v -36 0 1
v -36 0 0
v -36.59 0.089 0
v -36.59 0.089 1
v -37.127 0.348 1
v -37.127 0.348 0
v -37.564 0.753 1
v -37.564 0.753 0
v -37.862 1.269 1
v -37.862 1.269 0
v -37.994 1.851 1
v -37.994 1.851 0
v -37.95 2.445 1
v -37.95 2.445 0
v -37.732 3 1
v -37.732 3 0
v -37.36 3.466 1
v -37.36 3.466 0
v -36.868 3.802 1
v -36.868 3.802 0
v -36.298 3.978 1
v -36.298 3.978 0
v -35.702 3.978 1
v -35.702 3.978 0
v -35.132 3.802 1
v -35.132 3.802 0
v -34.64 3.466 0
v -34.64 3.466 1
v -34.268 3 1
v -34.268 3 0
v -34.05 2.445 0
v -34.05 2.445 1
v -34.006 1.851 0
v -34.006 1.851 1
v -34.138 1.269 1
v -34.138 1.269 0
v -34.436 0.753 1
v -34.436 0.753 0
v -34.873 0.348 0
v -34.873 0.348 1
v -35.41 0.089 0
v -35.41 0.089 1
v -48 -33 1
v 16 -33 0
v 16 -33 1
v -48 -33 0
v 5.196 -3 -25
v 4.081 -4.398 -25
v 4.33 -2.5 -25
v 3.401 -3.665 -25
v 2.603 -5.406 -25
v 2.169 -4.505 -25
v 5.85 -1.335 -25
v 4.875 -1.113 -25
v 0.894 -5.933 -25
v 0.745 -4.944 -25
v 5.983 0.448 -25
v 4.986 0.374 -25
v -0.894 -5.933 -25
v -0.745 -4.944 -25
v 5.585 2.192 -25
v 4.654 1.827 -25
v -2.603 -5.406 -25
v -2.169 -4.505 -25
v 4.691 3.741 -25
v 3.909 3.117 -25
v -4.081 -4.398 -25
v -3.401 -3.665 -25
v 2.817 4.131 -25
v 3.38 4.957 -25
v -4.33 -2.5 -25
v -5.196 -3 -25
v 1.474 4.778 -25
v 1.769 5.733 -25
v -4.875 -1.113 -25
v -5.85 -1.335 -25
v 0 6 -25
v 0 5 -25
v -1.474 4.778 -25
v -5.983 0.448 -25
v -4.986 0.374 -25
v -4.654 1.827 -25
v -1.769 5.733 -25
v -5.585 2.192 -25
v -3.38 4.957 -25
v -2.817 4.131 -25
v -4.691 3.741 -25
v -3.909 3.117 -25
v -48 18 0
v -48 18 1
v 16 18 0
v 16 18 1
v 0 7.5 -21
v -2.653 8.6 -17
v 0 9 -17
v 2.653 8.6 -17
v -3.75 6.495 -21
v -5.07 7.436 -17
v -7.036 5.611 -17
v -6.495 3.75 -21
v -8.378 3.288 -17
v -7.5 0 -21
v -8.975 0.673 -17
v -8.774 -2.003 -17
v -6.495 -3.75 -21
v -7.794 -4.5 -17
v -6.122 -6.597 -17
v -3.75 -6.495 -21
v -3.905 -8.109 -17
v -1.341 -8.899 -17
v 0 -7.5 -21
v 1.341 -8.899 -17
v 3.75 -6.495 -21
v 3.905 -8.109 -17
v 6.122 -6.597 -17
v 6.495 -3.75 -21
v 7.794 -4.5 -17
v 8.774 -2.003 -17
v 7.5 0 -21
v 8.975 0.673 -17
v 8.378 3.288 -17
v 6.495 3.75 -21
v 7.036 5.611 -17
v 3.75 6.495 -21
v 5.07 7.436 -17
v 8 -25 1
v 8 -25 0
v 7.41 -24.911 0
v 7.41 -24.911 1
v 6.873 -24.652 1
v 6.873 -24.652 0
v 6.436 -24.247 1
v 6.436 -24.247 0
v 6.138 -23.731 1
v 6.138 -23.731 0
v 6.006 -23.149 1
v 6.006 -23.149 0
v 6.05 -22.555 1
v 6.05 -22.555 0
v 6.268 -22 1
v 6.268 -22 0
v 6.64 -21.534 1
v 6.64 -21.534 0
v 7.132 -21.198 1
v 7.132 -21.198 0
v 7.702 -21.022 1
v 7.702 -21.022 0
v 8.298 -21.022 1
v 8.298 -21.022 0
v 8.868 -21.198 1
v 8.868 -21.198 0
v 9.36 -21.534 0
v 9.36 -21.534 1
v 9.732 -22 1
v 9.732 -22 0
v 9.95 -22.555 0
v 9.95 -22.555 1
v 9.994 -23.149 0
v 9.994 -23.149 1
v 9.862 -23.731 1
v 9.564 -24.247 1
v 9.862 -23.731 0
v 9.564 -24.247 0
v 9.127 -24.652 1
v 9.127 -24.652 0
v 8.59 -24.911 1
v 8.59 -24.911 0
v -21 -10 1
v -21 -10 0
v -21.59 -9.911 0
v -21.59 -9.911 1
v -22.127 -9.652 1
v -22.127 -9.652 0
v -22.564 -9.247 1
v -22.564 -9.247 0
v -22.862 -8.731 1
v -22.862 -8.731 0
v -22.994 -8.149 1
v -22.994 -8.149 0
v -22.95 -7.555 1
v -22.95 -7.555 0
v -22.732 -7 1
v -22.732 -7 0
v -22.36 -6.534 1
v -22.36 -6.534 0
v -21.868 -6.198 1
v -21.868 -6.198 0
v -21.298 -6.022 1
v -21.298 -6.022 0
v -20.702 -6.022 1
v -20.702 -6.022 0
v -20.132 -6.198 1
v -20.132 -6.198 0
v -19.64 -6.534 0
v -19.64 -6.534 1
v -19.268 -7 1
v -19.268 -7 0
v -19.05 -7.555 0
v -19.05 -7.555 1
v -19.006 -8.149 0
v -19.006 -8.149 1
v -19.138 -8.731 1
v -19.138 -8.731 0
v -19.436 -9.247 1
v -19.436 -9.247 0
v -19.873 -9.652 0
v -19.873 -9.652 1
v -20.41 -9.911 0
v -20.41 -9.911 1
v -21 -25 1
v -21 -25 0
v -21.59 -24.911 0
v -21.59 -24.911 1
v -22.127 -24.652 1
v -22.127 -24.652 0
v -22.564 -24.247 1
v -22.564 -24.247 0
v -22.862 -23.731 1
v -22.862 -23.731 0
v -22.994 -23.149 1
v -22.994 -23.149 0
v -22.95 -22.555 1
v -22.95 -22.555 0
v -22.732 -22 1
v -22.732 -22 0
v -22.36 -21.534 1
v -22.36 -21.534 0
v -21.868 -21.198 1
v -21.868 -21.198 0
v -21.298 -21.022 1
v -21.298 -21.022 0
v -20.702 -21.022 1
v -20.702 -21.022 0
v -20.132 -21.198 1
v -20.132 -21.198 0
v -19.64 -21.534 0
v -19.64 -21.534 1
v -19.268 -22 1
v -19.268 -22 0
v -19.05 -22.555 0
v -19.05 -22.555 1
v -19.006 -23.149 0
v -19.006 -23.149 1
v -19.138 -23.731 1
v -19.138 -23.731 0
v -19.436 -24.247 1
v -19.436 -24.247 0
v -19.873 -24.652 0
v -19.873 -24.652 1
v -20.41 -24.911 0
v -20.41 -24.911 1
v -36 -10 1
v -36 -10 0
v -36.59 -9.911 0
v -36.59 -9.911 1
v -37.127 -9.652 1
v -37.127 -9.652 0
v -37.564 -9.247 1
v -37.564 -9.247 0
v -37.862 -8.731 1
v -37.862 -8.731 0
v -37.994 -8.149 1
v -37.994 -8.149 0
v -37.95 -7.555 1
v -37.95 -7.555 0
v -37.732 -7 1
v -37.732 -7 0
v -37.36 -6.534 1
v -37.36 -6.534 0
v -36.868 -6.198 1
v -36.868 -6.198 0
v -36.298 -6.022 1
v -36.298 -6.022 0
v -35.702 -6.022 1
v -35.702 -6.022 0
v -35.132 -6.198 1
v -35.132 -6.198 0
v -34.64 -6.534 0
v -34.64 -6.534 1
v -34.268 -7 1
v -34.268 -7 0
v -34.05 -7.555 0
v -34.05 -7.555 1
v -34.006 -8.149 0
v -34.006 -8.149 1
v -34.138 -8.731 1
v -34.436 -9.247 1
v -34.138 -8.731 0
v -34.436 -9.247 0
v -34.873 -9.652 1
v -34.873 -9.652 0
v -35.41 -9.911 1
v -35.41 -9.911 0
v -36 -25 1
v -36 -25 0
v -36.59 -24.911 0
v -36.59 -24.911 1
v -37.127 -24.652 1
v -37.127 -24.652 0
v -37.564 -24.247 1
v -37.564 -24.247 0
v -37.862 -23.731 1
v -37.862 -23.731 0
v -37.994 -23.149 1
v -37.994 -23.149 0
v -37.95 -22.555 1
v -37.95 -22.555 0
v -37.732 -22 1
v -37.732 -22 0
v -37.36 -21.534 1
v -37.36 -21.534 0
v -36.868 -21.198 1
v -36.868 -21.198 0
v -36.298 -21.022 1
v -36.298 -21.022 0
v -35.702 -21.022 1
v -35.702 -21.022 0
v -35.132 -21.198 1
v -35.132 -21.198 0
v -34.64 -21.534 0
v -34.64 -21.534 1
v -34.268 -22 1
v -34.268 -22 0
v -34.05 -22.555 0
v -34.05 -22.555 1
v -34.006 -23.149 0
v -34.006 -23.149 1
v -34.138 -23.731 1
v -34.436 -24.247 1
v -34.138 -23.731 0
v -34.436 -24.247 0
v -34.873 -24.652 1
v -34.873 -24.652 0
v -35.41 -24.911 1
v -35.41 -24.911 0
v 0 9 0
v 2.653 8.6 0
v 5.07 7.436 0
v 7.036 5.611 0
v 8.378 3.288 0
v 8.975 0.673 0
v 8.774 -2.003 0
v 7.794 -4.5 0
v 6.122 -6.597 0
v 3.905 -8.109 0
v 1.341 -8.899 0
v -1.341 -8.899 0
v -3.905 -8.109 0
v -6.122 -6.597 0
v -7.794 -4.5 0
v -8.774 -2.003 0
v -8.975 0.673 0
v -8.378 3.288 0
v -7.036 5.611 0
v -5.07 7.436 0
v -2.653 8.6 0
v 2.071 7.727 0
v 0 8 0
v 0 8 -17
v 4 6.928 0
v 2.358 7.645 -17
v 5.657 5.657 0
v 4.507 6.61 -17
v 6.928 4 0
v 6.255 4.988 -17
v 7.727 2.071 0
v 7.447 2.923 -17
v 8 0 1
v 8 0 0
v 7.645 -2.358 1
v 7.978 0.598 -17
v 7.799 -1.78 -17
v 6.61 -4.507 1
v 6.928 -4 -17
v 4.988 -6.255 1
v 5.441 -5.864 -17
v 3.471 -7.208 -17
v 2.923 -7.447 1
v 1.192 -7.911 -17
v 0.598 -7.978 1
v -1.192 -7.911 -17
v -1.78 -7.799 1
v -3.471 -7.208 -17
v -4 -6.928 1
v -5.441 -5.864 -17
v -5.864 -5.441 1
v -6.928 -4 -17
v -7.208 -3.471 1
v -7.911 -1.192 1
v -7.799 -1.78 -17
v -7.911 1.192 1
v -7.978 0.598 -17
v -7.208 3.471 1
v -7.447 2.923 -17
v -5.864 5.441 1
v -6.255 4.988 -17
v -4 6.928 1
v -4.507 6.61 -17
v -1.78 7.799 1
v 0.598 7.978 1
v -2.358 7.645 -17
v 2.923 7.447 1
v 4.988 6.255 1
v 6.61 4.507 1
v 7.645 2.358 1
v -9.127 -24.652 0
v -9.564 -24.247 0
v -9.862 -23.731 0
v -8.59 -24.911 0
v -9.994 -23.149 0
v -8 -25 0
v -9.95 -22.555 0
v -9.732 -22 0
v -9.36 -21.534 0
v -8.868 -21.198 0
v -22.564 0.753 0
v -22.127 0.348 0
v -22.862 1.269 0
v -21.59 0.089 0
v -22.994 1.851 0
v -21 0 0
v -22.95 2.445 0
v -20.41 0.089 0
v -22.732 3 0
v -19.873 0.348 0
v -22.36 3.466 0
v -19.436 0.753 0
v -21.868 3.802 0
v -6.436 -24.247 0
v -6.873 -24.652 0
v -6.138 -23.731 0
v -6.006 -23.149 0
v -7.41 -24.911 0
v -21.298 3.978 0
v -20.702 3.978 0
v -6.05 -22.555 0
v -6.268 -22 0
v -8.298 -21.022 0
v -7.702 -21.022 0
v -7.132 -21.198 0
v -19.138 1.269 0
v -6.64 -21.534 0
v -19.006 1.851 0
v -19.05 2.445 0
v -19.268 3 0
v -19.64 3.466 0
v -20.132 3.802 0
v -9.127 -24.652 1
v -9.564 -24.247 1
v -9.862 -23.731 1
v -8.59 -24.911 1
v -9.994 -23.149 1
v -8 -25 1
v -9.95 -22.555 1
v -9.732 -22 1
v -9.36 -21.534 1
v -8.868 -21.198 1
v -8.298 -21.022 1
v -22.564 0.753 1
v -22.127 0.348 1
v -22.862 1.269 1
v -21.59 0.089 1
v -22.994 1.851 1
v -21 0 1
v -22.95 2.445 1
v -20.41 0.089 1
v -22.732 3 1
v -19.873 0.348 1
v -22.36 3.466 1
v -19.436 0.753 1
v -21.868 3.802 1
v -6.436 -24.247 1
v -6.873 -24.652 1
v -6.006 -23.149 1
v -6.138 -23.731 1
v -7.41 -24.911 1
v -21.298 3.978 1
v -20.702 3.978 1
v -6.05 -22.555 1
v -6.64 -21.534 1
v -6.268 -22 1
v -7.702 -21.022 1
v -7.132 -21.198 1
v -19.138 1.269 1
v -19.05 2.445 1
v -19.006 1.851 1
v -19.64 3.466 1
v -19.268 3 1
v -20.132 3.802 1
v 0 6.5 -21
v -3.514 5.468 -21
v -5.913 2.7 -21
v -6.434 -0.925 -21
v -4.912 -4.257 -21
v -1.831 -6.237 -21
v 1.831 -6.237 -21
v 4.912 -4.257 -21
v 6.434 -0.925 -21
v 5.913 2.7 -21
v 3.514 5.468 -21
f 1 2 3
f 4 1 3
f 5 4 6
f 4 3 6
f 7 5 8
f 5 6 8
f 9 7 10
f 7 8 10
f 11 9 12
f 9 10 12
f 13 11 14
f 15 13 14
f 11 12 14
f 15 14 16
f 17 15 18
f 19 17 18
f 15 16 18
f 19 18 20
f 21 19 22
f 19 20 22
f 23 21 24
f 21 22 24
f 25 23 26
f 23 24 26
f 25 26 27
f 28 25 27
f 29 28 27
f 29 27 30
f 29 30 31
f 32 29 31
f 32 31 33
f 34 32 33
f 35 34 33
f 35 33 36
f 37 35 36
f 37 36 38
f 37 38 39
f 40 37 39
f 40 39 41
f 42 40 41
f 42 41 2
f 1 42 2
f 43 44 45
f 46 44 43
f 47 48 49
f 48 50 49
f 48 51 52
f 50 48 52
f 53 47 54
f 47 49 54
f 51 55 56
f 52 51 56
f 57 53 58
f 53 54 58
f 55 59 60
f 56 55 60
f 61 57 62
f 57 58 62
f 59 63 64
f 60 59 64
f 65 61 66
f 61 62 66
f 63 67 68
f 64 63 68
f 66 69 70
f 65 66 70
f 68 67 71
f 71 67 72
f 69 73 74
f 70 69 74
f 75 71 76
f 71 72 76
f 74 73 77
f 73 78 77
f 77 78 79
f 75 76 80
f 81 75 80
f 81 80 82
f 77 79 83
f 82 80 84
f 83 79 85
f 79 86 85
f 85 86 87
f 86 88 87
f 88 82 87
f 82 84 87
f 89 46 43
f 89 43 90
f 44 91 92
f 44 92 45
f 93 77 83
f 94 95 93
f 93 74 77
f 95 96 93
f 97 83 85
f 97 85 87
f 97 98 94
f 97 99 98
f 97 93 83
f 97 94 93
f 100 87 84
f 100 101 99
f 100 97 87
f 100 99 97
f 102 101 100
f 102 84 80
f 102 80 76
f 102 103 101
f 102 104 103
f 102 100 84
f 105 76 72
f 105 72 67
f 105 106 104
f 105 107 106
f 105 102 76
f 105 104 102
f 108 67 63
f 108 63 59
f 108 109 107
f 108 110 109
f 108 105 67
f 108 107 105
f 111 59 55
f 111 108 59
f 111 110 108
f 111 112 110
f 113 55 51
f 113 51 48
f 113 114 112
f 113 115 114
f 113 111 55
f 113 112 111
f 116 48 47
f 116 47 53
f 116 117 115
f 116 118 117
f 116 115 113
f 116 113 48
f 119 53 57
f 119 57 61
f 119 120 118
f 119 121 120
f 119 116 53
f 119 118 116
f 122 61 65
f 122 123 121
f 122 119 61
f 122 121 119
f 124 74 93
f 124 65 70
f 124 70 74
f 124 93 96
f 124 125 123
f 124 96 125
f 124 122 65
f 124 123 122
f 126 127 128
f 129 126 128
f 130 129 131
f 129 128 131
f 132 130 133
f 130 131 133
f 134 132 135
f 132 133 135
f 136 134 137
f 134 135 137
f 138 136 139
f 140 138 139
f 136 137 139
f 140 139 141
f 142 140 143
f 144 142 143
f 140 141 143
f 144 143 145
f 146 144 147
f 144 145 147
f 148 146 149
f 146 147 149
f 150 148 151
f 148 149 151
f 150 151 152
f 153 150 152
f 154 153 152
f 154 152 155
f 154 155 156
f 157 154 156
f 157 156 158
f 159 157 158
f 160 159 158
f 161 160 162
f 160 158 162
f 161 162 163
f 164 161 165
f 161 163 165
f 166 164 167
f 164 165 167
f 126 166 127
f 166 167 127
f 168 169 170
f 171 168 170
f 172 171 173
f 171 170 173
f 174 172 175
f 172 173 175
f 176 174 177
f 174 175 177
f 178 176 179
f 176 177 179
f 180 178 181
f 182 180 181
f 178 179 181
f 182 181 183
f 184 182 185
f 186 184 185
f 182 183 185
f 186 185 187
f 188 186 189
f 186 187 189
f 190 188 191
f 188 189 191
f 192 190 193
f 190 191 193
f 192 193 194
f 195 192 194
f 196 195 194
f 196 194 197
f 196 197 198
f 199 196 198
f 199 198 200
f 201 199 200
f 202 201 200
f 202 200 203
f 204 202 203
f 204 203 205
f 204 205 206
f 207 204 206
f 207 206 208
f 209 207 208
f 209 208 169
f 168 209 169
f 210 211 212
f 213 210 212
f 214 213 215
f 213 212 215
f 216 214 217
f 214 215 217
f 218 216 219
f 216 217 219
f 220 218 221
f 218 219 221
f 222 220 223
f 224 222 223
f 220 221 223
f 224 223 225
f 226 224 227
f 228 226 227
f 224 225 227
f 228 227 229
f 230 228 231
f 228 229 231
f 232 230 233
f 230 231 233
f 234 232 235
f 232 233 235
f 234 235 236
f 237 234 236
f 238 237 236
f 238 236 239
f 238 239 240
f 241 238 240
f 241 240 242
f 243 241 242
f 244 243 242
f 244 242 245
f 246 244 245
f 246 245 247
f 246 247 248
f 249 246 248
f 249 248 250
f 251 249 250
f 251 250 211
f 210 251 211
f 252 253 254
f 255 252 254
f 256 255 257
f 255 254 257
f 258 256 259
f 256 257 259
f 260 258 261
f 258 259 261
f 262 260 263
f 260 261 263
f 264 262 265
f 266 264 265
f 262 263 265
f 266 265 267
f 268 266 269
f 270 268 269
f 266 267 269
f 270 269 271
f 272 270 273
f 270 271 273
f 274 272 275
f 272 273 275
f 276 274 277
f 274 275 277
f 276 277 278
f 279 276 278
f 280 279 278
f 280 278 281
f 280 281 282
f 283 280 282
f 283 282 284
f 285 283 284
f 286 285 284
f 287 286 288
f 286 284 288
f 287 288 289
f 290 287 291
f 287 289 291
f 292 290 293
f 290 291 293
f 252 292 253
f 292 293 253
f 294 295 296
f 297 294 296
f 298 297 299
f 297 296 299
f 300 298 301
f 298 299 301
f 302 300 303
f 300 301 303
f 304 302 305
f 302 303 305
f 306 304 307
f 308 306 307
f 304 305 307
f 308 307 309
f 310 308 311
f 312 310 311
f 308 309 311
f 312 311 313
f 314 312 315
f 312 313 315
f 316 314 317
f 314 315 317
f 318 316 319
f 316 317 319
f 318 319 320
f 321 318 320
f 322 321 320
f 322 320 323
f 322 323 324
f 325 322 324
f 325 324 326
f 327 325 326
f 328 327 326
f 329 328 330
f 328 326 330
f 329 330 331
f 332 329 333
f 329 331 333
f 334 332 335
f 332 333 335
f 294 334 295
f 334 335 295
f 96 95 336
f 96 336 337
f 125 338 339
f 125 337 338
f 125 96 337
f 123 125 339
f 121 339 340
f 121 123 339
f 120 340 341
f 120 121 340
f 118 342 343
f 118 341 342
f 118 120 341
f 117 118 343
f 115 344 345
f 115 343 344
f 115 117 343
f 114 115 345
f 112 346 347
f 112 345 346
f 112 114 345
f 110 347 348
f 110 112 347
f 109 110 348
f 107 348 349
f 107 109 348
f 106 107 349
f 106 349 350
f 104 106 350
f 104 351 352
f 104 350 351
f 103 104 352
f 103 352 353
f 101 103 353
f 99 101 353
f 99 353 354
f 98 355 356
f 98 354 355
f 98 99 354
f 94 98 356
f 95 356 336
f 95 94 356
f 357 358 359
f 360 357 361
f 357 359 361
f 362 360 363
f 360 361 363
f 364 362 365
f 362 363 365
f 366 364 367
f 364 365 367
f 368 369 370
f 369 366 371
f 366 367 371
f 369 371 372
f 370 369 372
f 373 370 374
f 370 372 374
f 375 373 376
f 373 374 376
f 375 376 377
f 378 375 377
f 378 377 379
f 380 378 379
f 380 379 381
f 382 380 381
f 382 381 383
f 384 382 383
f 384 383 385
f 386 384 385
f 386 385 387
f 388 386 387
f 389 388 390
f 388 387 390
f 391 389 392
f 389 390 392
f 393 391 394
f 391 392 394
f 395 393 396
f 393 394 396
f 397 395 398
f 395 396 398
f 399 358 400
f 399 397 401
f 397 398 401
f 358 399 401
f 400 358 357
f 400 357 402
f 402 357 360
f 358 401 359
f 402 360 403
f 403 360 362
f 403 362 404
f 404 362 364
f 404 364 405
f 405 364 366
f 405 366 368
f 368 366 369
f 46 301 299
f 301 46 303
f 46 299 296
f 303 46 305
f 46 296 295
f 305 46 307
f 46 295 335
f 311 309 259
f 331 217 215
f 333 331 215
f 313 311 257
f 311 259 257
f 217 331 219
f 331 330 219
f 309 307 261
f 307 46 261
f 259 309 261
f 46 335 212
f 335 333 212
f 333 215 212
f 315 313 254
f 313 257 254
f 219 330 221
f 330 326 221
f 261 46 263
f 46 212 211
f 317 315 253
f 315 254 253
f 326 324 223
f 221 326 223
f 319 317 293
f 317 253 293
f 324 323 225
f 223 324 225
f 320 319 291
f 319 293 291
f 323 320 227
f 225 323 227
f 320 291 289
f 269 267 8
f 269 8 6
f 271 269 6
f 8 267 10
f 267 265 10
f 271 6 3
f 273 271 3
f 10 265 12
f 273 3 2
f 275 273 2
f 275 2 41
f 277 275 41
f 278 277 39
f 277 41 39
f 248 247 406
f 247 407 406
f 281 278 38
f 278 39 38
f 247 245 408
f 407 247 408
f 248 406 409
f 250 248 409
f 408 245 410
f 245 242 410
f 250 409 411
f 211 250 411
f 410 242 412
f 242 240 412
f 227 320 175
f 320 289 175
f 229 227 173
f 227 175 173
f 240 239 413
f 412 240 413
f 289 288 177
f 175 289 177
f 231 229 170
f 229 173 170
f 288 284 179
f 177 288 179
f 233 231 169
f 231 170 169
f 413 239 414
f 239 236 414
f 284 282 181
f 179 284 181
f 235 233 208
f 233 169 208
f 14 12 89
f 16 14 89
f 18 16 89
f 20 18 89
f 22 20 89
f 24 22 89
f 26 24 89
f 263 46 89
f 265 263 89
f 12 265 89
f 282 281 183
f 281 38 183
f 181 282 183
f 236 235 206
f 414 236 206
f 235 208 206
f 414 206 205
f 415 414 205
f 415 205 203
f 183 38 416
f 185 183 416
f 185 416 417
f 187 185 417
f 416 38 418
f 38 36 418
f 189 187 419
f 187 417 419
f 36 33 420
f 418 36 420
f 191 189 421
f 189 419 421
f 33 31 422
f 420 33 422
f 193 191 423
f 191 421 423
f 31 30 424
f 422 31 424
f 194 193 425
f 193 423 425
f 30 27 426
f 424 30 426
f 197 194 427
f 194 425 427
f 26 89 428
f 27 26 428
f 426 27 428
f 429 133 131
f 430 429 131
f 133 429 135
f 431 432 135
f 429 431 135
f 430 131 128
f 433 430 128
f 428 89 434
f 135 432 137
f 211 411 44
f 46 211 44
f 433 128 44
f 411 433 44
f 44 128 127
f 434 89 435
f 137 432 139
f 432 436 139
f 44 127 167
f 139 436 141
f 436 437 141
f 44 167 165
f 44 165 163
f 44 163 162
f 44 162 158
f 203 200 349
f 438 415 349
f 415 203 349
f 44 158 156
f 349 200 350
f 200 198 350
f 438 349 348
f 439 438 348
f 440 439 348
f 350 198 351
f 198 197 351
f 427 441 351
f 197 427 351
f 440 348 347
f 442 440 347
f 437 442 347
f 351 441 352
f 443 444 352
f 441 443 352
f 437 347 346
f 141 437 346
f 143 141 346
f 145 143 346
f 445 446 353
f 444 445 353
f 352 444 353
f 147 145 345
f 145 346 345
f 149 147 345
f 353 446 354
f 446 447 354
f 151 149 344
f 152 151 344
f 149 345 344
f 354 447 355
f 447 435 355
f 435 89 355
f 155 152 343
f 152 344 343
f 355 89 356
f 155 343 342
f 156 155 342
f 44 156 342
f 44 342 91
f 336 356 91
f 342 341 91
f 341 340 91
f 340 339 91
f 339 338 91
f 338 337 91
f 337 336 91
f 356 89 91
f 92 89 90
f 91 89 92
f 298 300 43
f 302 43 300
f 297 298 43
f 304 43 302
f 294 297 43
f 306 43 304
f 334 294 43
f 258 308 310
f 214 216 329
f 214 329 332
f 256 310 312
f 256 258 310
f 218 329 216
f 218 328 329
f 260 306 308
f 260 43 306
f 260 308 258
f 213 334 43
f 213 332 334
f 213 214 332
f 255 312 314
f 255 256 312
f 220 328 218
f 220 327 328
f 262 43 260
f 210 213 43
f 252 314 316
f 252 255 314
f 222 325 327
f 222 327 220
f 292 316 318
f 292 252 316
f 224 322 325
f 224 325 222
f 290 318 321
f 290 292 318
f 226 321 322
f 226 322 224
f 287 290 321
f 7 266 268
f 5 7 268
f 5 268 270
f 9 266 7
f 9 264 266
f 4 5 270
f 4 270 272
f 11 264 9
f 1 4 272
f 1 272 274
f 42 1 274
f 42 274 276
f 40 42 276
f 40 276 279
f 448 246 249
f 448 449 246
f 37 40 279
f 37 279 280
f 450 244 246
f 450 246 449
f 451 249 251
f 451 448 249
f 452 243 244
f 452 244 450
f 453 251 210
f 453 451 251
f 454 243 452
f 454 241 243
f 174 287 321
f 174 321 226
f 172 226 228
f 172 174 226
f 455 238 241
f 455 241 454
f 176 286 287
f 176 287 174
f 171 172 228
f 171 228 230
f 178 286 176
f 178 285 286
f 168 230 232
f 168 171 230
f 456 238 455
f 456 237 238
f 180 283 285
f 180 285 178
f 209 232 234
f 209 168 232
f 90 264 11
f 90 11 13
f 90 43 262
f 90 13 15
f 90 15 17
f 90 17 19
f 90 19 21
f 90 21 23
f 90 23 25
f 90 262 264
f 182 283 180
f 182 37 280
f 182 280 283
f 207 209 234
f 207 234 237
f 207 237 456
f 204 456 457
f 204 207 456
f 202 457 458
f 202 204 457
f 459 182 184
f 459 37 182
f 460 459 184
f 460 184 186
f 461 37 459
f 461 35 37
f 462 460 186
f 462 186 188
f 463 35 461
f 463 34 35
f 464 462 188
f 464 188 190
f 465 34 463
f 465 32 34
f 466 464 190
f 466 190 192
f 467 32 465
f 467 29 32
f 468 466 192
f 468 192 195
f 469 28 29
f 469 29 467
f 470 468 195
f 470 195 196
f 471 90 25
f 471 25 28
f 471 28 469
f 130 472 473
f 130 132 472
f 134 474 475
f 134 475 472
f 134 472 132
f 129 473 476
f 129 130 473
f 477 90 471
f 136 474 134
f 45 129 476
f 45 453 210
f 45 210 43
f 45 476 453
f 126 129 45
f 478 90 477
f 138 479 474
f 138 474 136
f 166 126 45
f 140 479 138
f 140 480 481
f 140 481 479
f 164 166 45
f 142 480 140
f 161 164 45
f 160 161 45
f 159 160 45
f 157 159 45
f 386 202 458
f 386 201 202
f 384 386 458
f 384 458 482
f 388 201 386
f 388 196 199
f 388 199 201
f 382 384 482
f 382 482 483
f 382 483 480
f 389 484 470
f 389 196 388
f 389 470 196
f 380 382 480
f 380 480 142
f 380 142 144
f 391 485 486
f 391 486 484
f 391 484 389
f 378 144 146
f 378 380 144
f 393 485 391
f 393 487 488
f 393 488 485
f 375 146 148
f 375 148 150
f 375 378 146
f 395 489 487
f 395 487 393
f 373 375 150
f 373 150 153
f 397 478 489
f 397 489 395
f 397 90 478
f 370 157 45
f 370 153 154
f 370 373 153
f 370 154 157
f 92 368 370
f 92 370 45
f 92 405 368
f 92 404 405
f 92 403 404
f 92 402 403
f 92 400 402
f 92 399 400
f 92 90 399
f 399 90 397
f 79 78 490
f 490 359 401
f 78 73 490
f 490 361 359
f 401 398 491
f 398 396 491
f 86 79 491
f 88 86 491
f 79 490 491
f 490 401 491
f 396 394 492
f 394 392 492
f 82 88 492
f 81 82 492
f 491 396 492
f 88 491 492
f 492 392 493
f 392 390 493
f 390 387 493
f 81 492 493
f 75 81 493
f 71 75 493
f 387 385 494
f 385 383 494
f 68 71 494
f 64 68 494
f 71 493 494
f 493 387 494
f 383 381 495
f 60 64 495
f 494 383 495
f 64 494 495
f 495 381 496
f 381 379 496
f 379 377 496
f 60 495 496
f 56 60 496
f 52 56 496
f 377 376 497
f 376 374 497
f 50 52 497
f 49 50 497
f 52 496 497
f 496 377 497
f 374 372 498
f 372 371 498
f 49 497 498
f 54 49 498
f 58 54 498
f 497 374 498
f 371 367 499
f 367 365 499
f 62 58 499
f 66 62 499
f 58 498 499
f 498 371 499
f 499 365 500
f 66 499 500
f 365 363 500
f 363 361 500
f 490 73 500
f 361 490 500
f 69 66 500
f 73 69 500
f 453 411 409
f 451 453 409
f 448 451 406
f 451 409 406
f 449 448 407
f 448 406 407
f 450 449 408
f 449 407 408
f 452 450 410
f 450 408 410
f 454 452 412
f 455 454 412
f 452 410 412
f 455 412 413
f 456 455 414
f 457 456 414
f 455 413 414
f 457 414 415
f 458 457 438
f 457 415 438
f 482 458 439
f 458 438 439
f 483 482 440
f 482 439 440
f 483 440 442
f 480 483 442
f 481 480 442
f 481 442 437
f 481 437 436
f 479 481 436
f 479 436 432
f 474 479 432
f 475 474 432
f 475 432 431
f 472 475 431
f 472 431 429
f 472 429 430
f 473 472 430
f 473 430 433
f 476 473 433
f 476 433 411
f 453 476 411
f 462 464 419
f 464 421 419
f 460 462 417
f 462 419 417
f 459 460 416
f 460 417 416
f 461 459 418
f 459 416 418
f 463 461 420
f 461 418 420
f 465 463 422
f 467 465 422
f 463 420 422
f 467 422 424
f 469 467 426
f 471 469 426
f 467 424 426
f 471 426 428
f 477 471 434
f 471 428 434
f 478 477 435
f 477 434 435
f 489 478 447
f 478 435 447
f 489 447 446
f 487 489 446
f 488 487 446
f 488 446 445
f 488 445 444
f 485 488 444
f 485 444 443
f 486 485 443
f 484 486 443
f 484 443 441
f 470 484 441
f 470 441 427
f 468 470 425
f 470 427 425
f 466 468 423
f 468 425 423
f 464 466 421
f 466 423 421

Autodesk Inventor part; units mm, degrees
ref_plane "YZ Plane" through (0, 0, 0) normal (1, 0, 0) x (0, 1, 0)
ref_plane "XZ Plane" through (0, 0, 0) normal (0, 1, 0) x (-1, 0, 0)
ref_plane "XY Plane" through (0, 0, 0) normal (0, 0, 1) x (1, 0, 0)
sketch "Sketch1" plane through (0, 0, 0) normal (0, 0, 1) x (1, 0, 0)
  line L0 (-48, 18) -> (16, 18)
  line L1 (16, 18) -> (16, -33)
  line L2 (16, -33) -> (-48, -33)
  line L3 (-48, -33) -> (-48, 18)
  circle A0 centre (0, 0) radius 8
  dimension "d0" = 64
  dimension "d1" = 51
  dimension "d2" = 18
  dimension "d3" = 16
  dimension "d4" = 16
extrude "Extrusion1" add sketch "Sketch1" along normal blind 1
sketch "Sketch2" plane through (0, 0, 1) normal (0, 0, 1) x (1, 0, 0)
  line L0 (-48, 18) -> (-48, -33) projected
  line L1 (-48, -33) -> (16, -33) projected
  point P0 (0, 0)
  point P1 (-36, 2)
  point P2 (-36, -8)
  point P3 (-36, -23)
  point P4 (-21, 2)
  point P5 (-21, -8)
  point P6 (-21, -23)
  point P7 (-8, -23)
  point P8 (8, -23)
  dimension "d7" = 12
  dimension "d8" = 15
  dimension "d9" = 13
  dimension "d10" = 16
  dimension "d11" = 10
  dimension "d12" = 15
  dimension "d13" = 10
hole "Hole1" at (-36, 2, 1) at (-36, -8, 1) at (-36, -23, 1) at (-21, 2, 1) at (-21, -8, 1) at (-21, -23, 1) at (-8, -23, 1) at (8, -23, 1) direction (0, 0, -1) diameter 4 end through all
sketch "Sketch7" plane through (0, 0, 0) normal (1, 0, 0) x (0, 1, 0)
  line L0 (8, 0) -> (-8, 0) projected
  line L1 (5, -25) -> (6, -25)
  line L2 (18, 0) -> (-33, 0) projected
  line L3 (8, 0) -> (9, 0)
  line L4 (0, -31.2) -> (0, 5.2) projected
  line L5 (9, 0) -> (9, -17)
  line L6 (9, -17) -> (6, -25)
  line L7 (8, 0) -> (8, -17)
  line L8 (8, -17) -> (5, -25)
  point P0 (0, 0)
  dimension "d33" = 25
  dimension "d34" = 1
  dimension "d35" = 5
  dimension "d37" = 17
revolve "Revolution1" add sketch "Sketch7" angle 360 about axis through (0, 0, -10) along (0, 0, 1)
sketch "Sketch8" plane through (0, 0, -25) normal (0, 0, -1) x (-1, 0, 0)
  point P0 (0, 0)
properties part number "OpeningV2"
